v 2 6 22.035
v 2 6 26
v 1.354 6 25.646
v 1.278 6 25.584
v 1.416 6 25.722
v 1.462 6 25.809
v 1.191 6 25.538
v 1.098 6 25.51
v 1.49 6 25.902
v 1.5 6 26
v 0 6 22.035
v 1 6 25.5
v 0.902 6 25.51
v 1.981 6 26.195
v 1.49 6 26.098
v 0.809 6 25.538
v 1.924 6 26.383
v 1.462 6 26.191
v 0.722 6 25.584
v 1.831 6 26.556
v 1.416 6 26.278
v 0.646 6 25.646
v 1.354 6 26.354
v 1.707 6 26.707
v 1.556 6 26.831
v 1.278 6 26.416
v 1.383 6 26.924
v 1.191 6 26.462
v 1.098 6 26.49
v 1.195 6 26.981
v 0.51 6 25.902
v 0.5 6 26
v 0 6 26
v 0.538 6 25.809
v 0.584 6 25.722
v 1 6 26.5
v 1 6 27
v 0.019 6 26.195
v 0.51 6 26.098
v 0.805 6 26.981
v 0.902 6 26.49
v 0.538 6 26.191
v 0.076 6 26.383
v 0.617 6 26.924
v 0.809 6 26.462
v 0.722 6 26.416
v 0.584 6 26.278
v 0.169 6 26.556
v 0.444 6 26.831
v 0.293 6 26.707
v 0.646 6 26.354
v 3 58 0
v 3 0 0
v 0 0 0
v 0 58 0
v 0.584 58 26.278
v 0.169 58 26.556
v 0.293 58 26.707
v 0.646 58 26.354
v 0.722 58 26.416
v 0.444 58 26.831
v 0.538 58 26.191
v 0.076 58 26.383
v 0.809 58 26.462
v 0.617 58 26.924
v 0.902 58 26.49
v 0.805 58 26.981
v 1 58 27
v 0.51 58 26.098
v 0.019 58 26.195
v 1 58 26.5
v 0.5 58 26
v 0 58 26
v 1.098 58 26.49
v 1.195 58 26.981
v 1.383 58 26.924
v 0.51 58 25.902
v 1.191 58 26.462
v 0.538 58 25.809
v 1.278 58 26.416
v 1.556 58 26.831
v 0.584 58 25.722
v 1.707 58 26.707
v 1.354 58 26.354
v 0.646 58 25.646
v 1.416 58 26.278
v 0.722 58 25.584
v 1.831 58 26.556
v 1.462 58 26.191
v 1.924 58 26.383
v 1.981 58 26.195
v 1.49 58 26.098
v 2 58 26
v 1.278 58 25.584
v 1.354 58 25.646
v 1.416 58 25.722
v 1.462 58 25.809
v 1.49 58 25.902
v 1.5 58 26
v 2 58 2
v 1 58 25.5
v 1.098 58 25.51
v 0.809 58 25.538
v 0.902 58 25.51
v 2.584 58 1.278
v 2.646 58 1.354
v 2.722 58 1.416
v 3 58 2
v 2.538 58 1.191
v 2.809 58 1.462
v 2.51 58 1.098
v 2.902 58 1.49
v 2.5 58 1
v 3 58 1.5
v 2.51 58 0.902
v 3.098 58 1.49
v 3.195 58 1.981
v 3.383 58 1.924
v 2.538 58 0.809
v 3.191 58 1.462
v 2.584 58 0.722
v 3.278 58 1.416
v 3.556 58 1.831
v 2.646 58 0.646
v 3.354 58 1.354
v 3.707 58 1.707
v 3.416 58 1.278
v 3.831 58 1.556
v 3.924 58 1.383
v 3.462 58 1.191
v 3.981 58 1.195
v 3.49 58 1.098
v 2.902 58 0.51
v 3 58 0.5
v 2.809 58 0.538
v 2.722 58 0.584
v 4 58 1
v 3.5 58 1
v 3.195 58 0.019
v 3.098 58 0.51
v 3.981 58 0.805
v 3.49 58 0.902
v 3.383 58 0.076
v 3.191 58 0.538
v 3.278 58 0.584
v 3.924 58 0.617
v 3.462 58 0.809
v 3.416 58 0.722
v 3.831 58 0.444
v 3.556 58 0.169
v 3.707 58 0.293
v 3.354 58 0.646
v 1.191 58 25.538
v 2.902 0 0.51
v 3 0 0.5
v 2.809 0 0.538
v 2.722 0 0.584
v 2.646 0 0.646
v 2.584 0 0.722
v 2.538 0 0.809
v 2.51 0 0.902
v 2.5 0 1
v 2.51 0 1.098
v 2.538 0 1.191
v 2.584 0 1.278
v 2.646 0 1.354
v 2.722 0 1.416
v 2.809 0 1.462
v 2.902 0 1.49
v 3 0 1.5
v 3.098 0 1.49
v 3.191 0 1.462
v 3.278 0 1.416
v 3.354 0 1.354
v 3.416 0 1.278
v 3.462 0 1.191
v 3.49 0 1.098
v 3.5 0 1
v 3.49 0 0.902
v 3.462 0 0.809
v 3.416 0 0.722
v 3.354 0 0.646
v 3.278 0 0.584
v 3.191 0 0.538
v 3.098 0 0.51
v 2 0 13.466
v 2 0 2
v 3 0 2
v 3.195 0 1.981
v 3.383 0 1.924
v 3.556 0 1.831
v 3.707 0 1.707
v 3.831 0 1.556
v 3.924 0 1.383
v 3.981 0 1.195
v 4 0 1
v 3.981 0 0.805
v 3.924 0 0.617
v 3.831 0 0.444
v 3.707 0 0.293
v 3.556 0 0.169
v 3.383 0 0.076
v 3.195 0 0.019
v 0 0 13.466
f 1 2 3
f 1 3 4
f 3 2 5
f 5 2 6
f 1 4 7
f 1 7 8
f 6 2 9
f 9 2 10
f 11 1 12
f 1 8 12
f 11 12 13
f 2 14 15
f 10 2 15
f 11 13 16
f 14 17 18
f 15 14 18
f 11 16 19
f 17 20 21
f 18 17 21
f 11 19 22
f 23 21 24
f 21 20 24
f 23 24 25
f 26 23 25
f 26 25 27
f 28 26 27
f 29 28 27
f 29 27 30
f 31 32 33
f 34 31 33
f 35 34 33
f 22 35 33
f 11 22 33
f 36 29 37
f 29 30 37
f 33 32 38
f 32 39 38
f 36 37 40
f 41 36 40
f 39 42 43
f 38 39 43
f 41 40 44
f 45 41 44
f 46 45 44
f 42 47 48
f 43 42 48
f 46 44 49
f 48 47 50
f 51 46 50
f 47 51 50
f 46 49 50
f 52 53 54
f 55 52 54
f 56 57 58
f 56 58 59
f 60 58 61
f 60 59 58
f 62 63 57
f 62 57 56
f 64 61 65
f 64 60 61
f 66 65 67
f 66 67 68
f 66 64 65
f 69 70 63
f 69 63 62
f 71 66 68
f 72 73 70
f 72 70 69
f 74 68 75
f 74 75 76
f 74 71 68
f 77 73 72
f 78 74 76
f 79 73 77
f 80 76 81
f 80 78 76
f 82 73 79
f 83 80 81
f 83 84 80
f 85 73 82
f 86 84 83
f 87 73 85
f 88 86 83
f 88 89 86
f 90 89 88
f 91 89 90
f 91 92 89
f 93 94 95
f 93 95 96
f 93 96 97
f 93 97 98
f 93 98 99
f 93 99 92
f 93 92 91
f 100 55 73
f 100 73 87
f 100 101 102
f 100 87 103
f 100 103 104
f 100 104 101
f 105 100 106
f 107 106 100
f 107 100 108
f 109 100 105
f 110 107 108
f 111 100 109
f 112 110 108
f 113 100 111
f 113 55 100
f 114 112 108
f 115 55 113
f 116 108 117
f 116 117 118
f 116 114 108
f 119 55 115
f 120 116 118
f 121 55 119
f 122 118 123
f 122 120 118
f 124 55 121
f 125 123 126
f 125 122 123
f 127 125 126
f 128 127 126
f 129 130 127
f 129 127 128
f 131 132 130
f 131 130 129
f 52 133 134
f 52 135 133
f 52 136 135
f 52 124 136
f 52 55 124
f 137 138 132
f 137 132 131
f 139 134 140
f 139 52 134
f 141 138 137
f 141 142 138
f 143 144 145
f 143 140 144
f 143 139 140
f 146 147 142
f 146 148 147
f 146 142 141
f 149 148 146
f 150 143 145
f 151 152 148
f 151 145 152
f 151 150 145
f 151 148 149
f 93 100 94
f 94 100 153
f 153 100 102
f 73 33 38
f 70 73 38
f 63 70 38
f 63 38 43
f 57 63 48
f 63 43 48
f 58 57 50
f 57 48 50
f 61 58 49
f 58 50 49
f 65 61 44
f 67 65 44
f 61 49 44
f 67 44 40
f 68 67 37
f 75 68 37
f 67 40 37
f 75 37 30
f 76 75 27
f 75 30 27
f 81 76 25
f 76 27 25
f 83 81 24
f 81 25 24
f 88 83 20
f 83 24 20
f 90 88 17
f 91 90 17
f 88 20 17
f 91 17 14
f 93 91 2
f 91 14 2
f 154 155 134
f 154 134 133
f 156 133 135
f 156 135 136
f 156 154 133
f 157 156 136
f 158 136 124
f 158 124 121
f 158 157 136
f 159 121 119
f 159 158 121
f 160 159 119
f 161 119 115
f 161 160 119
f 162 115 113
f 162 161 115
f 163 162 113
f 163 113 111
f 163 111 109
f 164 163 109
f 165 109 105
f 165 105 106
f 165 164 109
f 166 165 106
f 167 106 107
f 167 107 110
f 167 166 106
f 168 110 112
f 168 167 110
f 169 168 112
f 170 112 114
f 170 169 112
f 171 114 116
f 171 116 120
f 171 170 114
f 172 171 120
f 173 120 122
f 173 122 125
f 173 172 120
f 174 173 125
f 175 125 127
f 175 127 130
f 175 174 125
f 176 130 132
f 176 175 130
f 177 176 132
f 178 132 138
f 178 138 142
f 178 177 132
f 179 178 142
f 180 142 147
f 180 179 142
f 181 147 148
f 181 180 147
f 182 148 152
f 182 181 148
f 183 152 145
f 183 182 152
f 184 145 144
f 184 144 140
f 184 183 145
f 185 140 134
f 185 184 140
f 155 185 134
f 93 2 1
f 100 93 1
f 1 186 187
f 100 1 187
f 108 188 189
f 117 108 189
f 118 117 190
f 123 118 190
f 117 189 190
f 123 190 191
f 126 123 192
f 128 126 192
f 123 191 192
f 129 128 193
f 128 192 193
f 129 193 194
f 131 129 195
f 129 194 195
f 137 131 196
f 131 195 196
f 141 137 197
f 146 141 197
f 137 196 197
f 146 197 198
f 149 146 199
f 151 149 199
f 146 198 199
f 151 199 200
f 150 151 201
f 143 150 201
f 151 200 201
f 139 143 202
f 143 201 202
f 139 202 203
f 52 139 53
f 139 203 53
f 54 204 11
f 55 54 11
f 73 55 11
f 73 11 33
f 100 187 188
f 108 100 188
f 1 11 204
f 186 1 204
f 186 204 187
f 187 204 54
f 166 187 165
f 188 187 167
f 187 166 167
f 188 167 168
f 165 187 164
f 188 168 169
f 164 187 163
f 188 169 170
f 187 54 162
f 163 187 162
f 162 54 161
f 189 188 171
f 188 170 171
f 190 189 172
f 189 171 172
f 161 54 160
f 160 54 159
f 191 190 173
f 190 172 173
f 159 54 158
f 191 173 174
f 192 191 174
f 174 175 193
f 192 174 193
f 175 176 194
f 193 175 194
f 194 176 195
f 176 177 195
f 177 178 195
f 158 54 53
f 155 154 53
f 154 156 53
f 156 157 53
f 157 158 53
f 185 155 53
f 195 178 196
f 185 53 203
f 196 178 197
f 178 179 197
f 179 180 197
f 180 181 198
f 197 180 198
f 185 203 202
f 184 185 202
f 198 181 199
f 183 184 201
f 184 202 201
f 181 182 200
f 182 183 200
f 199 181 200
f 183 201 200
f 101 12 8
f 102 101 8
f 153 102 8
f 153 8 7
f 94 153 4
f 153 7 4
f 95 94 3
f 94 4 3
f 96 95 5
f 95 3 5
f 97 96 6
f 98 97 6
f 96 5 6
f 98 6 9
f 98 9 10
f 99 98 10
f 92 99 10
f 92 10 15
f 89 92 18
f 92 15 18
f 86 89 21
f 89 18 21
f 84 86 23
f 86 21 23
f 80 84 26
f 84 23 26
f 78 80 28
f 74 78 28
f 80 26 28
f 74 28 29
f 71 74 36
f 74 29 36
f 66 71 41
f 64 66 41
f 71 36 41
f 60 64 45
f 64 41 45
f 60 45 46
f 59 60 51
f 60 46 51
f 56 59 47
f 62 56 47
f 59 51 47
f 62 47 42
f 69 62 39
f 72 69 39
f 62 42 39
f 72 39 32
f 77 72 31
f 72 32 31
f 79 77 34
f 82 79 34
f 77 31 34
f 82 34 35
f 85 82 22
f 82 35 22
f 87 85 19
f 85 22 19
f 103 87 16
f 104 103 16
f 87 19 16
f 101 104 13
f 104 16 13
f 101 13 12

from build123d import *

# Parameters (mm, degrees)
EXTRUDE_1_DEPTH = 2
SKETCH_3_R      = 0.5
EXTRUDE_3_DEPTH = 52
SKETCH_4_R      = 0.5
EXTRUDE_4_DEPTH = 58


with BuildPart() as part:
    # Эскиз1 → Бобышка-Вытянуть1 (new body)
    with BuildSketch(Plane(origin=(0, 0, 0), x_dir=(0, 0, -1), z_dir=(1, 0, 0))):
        Polygon((-25, 6), (-22.034972426, 6), (-13.466084386, 0), (0, 0), (0, 58), (-25, 58), align=None)
    extrude(amount=EXTRUDE_1_DEPTH)

    # Эскиз3 → Бобышка-Вытянуть3 (add)
    with BuildSketch(Plane.XZ.offset(-6)):
        with BuildLine():
            Line((0, 25), (0, 26))
            ThreePointArc((0, 26), (1, 27), (2, 26))
            Line((2, 26), (2, 25))
            Line((2, 25), (0, 25))
        make_face()
        with Locations(Location((1, 26, 0), (0, 0, 270))):
            Circle(SKETCH_3_R, mode=Mode.SUBTRACT)
    extrude(amount=-EXTRUDE_3_DEPTH)

    # Эскиз4 → Бобышка-Вытянуть4 (add)
    with BuildSketch(Plane(origin=(0, 0, 0), x_dir=(1, 0, 0), z_dir=(0, 1, 0))):
        with BuildLine():
            Line((3, 0), (2, 0))
            Line((2, 0), (2, -2))
            Line((2, -2), (3, -2))
            ThreePointArc((3, -2), (4, -1), (3, 0))
        make_face()
        with Locations(Location((3, -1, 0), (0, 0, 90))):
            Circle(SKETCH_4_R, mode=Mode.SUBTRACT)
    extrude(amount=EXTRUDE_4_DEPTH)


solid = part.part
